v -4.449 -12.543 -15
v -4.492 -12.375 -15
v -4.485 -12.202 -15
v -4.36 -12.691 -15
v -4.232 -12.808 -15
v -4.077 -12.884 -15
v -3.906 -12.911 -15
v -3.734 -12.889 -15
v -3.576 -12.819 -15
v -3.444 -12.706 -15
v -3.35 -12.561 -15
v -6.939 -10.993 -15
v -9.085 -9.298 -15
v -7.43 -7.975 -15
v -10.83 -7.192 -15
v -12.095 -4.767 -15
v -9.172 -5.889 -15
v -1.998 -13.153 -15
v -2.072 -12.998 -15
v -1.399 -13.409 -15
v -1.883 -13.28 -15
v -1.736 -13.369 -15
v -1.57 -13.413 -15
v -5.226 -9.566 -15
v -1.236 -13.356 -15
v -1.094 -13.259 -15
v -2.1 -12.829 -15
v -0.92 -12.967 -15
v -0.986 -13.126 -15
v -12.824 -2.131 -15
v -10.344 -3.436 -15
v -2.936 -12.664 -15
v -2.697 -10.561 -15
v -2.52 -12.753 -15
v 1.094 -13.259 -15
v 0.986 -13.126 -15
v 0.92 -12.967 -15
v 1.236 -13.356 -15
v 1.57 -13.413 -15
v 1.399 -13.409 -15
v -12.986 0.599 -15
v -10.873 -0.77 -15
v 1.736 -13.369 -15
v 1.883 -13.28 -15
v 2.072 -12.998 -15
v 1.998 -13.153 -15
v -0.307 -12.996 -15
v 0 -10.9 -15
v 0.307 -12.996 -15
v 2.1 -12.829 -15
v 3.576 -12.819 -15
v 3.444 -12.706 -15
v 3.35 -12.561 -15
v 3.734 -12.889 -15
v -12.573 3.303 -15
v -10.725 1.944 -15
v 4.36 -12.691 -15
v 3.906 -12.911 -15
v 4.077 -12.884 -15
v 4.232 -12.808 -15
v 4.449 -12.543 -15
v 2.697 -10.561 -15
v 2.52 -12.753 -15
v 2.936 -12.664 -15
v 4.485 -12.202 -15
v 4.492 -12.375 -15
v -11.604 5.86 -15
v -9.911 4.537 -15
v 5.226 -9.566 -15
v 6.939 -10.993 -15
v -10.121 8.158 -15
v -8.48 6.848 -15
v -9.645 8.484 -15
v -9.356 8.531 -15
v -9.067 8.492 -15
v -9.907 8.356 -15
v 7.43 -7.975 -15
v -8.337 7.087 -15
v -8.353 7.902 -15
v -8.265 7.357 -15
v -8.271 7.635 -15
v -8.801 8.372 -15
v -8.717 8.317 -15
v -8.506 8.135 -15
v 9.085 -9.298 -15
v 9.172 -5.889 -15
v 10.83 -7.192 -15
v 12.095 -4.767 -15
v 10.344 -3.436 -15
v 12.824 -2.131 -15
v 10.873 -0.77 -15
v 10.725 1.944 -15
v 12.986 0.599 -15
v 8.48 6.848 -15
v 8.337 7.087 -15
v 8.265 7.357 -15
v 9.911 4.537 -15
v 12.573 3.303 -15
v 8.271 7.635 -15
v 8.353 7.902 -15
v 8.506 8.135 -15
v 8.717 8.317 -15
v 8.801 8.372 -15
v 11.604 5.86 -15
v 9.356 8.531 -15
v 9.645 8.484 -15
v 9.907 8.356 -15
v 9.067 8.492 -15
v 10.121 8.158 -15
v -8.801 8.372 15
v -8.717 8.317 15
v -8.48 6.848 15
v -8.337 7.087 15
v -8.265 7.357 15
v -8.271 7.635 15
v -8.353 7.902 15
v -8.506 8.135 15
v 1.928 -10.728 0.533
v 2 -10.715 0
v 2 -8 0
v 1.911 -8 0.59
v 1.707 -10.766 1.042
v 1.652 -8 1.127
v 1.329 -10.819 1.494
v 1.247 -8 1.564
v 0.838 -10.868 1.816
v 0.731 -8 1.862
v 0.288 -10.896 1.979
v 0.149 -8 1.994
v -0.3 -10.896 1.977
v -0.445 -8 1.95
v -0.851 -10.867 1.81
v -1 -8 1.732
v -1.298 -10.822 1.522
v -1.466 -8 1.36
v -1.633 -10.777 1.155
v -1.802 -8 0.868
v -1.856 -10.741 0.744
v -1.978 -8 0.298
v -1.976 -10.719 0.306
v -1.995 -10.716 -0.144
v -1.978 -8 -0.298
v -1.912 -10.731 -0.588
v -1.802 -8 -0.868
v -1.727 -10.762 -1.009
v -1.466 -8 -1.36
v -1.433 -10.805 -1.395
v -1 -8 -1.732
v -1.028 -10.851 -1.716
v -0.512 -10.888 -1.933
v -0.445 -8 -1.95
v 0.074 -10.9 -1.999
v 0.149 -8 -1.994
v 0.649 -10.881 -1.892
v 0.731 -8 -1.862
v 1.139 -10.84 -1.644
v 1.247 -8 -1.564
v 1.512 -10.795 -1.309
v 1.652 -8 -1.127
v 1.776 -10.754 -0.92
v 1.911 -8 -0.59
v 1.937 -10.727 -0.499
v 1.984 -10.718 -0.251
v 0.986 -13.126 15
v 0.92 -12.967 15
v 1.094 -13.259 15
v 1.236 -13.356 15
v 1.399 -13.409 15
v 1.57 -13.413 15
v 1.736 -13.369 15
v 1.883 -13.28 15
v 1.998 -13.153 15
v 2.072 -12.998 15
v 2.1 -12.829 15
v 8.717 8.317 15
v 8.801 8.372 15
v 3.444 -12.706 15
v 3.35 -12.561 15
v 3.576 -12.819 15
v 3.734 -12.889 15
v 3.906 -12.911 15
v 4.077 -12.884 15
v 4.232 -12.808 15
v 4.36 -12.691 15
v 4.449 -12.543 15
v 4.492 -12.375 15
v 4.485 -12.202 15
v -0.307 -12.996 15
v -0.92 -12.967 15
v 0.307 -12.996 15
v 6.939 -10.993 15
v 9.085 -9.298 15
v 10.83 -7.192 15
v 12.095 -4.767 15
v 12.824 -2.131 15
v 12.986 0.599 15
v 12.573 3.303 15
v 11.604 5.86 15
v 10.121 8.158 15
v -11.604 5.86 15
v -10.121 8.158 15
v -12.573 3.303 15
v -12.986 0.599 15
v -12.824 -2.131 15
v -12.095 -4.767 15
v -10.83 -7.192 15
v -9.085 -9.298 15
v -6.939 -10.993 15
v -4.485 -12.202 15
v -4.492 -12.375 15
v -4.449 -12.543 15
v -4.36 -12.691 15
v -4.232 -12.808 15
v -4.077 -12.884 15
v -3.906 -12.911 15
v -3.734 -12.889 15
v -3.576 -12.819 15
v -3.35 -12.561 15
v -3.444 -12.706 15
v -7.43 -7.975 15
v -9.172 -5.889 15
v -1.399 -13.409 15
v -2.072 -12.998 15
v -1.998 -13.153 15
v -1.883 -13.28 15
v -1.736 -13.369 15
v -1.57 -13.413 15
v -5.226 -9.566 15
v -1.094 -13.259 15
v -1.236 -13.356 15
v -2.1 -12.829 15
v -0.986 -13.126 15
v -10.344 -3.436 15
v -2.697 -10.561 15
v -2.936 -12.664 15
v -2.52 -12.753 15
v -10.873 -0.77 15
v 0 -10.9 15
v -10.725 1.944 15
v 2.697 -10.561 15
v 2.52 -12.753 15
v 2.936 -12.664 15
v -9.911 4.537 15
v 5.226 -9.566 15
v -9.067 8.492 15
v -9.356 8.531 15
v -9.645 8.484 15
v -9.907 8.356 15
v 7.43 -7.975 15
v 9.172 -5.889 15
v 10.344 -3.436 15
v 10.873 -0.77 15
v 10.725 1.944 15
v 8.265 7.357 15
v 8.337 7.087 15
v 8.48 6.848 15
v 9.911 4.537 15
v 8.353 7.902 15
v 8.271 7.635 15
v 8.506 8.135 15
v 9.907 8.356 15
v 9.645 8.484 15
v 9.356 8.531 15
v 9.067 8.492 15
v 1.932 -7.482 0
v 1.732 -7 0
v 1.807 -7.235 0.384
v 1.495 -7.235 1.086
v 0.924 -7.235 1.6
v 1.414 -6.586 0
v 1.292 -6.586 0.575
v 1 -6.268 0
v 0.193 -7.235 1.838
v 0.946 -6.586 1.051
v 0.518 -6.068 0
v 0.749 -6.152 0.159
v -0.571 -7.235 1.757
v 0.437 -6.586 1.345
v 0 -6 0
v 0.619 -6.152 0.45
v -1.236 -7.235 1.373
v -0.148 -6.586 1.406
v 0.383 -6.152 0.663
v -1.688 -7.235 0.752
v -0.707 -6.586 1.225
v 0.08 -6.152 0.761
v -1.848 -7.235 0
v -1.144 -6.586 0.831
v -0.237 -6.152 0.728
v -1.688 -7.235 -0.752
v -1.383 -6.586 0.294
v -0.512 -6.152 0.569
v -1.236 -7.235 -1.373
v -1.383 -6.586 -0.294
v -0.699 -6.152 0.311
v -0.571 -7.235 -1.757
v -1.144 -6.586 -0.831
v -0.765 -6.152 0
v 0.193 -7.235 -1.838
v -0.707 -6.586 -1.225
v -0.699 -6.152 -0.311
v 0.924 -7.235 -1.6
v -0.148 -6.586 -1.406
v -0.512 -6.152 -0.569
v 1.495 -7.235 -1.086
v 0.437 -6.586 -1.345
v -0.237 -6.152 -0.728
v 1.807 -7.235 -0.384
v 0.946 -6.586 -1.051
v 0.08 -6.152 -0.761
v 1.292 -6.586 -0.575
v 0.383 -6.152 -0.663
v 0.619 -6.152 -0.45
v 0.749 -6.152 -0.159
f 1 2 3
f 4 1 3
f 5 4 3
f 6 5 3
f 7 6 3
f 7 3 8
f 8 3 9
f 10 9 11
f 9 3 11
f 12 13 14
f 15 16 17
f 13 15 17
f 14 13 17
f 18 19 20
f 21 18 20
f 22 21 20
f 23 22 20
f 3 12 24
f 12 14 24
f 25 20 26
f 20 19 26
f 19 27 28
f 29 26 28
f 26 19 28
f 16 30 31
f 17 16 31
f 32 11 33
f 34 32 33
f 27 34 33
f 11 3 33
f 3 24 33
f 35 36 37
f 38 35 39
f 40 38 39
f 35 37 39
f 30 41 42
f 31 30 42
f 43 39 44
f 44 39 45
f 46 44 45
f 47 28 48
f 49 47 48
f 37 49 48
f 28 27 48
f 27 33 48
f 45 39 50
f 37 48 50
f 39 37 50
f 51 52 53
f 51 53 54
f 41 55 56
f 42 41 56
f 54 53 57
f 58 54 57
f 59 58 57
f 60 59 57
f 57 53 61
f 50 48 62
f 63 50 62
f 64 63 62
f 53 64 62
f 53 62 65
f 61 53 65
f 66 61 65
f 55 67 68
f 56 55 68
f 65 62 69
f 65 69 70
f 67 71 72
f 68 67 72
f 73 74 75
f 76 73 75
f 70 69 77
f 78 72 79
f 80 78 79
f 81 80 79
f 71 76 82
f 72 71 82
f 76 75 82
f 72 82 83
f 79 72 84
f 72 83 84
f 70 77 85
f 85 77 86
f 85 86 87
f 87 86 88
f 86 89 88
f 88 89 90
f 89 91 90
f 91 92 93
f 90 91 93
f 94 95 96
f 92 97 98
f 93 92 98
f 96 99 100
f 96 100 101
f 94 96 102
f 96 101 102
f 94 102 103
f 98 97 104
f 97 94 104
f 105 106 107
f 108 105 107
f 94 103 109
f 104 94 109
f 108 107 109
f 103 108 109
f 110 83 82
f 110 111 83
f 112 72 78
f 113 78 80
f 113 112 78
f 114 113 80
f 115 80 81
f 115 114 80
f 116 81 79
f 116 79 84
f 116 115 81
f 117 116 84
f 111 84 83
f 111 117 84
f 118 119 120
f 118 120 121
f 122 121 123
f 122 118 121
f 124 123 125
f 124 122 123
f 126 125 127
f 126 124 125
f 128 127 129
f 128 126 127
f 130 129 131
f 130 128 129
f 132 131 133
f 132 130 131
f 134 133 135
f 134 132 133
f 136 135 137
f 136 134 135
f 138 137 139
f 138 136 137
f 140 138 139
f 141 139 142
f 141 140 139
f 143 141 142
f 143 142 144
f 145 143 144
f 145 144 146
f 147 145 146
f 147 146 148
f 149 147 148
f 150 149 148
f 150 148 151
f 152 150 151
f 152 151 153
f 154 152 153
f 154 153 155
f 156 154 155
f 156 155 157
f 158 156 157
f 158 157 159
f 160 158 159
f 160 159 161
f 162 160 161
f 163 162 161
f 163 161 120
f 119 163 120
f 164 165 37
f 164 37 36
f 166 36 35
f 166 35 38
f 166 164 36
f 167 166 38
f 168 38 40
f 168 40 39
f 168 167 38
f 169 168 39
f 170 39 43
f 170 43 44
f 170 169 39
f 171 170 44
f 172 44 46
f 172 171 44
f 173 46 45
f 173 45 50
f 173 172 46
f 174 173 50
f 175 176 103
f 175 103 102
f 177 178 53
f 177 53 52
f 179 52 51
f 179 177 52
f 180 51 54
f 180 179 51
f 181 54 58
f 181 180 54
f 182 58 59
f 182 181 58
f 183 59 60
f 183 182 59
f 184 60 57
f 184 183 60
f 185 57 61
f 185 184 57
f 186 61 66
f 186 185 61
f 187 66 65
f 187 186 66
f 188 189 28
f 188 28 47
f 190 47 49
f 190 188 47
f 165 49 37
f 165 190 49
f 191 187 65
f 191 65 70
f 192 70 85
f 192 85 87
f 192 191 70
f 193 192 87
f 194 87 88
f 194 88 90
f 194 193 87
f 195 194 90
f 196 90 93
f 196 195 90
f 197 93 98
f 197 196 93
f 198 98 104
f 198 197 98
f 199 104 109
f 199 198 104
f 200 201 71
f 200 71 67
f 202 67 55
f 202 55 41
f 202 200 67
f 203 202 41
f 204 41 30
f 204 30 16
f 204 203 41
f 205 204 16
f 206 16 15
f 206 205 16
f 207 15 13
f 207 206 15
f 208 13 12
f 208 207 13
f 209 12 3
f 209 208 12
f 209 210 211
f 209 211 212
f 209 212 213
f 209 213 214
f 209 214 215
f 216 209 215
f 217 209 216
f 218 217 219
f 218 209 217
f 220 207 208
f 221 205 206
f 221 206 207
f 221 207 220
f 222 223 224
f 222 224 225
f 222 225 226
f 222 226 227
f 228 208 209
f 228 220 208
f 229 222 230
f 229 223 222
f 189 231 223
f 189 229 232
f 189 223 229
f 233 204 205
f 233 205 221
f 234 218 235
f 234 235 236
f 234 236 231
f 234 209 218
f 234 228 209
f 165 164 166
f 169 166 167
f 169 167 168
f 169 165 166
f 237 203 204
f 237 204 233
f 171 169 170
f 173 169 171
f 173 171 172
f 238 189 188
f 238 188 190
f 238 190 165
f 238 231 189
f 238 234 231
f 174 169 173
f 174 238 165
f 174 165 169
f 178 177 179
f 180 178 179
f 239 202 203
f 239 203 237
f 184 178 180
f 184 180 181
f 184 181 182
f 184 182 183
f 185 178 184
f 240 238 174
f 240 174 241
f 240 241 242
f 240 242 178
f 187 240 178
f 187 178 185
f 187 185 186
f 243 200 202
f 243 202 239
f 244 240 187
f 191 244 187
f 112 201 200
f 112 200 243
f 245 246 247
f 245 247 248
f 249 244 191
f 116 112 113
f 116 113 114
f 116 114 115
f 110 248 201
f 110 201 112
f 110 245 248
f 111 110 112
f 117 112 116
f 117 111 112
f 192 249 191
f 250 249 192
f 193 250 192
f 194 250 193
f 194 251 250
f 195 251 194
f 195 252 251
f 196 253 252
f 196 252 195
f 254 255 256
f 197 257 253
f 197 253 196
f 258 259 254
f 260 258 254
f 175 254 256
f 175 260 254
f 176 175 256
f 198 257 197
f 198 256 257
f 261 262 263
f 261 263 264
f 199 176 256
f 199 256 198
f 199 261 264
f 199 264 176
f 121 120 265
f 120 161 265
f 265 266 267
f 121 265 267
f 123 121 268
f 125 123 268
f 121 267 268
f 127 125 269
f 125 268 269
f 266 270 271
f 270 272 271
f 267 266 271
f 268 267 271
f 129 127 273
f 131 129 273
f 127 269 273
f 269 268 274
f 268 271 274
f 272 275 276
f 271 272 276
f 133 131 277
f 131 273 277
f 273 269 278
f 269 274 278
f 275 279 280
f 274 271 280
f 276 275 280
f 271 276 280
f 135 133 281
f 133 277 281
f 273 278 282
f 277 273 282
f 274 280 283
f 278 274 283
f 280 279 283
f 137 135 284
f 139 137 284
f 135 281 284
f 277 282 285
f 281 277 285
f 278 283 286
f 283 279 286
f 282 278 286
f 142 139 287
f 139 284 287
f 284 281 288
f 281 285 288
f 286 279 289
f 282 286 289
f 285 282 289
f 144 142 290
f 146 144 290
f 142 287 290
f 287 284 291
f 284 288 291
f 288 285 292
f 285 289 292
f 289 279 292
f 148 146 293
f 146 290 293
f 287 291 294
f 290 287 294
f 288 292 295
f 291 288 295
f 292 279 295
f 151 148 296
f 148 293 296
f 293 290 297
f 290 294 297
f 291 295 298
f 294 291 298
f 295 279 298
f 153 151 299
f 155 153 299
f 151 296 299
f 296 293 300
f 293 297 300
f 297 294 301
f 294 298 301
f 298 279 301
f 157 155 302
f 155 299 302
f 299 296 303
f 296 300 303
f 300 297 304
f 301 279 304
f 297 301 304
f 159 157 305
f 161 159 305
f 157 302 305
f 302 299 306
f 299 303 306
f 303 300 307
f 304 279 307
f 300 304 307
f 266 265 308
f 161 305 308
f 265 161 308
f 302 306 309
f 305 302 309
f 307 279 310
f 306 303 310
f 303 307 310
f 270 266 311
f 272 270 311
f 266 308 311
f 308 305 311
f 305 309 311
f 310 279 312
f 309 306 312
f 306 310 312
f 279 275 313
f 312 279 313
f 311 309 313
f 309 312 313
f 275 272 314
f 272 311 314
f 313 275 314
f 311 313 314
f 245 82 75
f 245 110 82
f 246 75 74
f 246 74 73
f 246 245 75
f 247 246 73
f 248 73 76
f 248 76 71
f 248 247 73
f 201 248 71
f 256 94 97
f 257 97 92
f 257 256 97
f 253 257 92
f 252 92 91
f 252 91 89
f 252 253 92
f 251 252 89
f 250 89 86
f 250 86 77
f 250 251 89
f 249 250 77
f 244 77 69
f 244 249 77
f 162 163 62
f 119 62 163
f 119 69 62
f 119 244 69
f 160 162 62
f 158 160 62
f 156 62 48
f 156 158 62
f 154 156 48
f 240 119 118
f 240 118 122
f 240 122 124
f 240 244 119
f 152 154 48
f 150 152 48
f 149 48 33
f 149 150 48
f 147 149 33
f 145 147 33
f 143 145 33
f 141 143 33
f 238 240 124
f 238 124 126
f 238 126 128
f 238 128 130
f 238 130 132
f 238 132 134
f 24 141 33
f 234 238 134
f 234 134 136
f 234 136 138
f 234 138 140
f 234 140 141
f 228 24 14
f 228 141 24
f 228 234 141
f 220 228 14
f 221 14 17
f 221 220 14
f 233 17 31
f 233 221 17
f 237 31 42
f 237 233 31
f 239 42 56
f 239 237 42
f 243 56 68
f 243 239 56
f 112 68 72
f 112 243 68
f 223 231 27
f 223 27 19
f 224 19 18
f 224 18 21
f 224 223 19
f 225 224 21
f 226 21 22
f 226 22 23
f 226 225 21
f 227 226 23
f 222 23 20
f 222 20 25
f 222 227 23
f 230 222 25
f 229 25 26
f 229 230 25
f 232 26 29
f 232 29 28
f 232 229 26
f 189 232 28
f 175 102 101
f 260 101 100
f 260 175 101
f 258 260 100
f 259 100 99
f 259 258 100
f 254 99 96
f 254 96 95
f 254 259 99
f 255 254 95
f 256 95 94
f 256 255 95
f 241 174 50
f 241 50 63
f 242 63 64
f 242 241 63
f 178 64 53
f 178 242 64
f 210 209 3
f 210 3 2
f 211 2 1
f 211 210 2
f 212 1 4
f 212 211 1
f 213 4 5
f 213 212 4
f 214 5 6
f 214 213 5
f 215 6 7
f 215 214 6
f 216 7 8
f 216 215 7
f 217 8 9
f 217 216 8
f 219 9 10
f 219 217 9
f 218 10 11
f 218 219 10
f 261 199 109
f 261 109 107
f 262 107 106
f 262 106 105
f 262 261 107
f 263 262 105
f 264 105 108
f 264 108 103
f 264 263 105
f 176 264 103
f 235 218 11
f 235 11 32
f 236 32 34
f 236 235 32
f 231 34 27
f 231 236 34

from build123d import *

# Parameters (mm, degrees)
F1_DEPTH      = 15
F1_DEPTH_BACK = 15
F3_R          = 2
F4_DEPTH      = 5.5
F5_R          = 2


with BuildPart() as f1:
    # F0 (on Top) → F1 (new body, two sides)
    with BuildSketch(Plane.XY) as f1_sk:
        with BuildLine():
            ThreePointArc((-8.801296, 8.371598), (-9.502154, 8.518054), (-10.121276, 8.158417))
            ThreePointArc((-10.121276, 8.158417), (-12.52886, -3.468091), (-4.485436, -12.201675))
            ThreePointArc((-4.485436, -12.201675), (-4.076574, -12.883522), (-3.349904, -12.560977))
            ThreePointArc((-3.349904, -12.560977), (-2.728421, -12.710457), (-2.100341, -12.829208))
            ThreePointArc((-2.100341, -12.829208), (-1.570219, -13.413333), (-0.919519, -12.967439))
            ThreePointArc((-0.919519, -12.967439), (0, -13), (0.919519, -12.967439))
            ThreePointArc((0.919519, -12.967439), (1.570219, -13.413333), (2.100341, -12.829208))
            ThreePointArc((2.100341, -12.829208), (2.728421, -12.710457), (3.349904, -12.560977))
            ThreePointArc((3.349904, -12.560977), (4.076574, -12.883522), (4.485436, -12.201675))
            ThreePointArc((4.485436, -12.201675), (12.52886, -3.468091), (10.121276, 8.158417))
            ThreePointArc((10.121276, 8.158417), (9.502154, 8.518054), (8.801296, 8.371598))
            Line((8.801296, 8.371598), (8.716739, 8.317146))
            ThreePointArc((8.716739, 8.317146), (8.270881, 7.635389), (8.480163, 6.848126))
            ThreePointArc((8.480163, 6.848126), (0, -10.9), (-8.480163, 6.848126))
            ThreePointArc((-8.480163, 6.848126), (-8.270881, 7.635389), (-8.716739, 8.317146))
            Line((-8.716739, 8.317146), (-8.801296, 8.371598))
        make_face()
    extrude(amount=F1_DEPTH)
    extrude(f1_sk.sketch, amount=-F1_DEPTH_BACK)

    # F3 (on offset) → F4 (join)
    with BuildSketch(Plane.XZ.offset(11.5)):
        Circle(F3_R)
    extrude(amount=-F4_DEPTH)

    # F5
    f5_edges = [f1.edges().sort_by_distance(p)[0] for p in [
        (-2, -6, 0),
    ]]
    fillet(f5_edges, radius=F5_R)


solid = f1.part
